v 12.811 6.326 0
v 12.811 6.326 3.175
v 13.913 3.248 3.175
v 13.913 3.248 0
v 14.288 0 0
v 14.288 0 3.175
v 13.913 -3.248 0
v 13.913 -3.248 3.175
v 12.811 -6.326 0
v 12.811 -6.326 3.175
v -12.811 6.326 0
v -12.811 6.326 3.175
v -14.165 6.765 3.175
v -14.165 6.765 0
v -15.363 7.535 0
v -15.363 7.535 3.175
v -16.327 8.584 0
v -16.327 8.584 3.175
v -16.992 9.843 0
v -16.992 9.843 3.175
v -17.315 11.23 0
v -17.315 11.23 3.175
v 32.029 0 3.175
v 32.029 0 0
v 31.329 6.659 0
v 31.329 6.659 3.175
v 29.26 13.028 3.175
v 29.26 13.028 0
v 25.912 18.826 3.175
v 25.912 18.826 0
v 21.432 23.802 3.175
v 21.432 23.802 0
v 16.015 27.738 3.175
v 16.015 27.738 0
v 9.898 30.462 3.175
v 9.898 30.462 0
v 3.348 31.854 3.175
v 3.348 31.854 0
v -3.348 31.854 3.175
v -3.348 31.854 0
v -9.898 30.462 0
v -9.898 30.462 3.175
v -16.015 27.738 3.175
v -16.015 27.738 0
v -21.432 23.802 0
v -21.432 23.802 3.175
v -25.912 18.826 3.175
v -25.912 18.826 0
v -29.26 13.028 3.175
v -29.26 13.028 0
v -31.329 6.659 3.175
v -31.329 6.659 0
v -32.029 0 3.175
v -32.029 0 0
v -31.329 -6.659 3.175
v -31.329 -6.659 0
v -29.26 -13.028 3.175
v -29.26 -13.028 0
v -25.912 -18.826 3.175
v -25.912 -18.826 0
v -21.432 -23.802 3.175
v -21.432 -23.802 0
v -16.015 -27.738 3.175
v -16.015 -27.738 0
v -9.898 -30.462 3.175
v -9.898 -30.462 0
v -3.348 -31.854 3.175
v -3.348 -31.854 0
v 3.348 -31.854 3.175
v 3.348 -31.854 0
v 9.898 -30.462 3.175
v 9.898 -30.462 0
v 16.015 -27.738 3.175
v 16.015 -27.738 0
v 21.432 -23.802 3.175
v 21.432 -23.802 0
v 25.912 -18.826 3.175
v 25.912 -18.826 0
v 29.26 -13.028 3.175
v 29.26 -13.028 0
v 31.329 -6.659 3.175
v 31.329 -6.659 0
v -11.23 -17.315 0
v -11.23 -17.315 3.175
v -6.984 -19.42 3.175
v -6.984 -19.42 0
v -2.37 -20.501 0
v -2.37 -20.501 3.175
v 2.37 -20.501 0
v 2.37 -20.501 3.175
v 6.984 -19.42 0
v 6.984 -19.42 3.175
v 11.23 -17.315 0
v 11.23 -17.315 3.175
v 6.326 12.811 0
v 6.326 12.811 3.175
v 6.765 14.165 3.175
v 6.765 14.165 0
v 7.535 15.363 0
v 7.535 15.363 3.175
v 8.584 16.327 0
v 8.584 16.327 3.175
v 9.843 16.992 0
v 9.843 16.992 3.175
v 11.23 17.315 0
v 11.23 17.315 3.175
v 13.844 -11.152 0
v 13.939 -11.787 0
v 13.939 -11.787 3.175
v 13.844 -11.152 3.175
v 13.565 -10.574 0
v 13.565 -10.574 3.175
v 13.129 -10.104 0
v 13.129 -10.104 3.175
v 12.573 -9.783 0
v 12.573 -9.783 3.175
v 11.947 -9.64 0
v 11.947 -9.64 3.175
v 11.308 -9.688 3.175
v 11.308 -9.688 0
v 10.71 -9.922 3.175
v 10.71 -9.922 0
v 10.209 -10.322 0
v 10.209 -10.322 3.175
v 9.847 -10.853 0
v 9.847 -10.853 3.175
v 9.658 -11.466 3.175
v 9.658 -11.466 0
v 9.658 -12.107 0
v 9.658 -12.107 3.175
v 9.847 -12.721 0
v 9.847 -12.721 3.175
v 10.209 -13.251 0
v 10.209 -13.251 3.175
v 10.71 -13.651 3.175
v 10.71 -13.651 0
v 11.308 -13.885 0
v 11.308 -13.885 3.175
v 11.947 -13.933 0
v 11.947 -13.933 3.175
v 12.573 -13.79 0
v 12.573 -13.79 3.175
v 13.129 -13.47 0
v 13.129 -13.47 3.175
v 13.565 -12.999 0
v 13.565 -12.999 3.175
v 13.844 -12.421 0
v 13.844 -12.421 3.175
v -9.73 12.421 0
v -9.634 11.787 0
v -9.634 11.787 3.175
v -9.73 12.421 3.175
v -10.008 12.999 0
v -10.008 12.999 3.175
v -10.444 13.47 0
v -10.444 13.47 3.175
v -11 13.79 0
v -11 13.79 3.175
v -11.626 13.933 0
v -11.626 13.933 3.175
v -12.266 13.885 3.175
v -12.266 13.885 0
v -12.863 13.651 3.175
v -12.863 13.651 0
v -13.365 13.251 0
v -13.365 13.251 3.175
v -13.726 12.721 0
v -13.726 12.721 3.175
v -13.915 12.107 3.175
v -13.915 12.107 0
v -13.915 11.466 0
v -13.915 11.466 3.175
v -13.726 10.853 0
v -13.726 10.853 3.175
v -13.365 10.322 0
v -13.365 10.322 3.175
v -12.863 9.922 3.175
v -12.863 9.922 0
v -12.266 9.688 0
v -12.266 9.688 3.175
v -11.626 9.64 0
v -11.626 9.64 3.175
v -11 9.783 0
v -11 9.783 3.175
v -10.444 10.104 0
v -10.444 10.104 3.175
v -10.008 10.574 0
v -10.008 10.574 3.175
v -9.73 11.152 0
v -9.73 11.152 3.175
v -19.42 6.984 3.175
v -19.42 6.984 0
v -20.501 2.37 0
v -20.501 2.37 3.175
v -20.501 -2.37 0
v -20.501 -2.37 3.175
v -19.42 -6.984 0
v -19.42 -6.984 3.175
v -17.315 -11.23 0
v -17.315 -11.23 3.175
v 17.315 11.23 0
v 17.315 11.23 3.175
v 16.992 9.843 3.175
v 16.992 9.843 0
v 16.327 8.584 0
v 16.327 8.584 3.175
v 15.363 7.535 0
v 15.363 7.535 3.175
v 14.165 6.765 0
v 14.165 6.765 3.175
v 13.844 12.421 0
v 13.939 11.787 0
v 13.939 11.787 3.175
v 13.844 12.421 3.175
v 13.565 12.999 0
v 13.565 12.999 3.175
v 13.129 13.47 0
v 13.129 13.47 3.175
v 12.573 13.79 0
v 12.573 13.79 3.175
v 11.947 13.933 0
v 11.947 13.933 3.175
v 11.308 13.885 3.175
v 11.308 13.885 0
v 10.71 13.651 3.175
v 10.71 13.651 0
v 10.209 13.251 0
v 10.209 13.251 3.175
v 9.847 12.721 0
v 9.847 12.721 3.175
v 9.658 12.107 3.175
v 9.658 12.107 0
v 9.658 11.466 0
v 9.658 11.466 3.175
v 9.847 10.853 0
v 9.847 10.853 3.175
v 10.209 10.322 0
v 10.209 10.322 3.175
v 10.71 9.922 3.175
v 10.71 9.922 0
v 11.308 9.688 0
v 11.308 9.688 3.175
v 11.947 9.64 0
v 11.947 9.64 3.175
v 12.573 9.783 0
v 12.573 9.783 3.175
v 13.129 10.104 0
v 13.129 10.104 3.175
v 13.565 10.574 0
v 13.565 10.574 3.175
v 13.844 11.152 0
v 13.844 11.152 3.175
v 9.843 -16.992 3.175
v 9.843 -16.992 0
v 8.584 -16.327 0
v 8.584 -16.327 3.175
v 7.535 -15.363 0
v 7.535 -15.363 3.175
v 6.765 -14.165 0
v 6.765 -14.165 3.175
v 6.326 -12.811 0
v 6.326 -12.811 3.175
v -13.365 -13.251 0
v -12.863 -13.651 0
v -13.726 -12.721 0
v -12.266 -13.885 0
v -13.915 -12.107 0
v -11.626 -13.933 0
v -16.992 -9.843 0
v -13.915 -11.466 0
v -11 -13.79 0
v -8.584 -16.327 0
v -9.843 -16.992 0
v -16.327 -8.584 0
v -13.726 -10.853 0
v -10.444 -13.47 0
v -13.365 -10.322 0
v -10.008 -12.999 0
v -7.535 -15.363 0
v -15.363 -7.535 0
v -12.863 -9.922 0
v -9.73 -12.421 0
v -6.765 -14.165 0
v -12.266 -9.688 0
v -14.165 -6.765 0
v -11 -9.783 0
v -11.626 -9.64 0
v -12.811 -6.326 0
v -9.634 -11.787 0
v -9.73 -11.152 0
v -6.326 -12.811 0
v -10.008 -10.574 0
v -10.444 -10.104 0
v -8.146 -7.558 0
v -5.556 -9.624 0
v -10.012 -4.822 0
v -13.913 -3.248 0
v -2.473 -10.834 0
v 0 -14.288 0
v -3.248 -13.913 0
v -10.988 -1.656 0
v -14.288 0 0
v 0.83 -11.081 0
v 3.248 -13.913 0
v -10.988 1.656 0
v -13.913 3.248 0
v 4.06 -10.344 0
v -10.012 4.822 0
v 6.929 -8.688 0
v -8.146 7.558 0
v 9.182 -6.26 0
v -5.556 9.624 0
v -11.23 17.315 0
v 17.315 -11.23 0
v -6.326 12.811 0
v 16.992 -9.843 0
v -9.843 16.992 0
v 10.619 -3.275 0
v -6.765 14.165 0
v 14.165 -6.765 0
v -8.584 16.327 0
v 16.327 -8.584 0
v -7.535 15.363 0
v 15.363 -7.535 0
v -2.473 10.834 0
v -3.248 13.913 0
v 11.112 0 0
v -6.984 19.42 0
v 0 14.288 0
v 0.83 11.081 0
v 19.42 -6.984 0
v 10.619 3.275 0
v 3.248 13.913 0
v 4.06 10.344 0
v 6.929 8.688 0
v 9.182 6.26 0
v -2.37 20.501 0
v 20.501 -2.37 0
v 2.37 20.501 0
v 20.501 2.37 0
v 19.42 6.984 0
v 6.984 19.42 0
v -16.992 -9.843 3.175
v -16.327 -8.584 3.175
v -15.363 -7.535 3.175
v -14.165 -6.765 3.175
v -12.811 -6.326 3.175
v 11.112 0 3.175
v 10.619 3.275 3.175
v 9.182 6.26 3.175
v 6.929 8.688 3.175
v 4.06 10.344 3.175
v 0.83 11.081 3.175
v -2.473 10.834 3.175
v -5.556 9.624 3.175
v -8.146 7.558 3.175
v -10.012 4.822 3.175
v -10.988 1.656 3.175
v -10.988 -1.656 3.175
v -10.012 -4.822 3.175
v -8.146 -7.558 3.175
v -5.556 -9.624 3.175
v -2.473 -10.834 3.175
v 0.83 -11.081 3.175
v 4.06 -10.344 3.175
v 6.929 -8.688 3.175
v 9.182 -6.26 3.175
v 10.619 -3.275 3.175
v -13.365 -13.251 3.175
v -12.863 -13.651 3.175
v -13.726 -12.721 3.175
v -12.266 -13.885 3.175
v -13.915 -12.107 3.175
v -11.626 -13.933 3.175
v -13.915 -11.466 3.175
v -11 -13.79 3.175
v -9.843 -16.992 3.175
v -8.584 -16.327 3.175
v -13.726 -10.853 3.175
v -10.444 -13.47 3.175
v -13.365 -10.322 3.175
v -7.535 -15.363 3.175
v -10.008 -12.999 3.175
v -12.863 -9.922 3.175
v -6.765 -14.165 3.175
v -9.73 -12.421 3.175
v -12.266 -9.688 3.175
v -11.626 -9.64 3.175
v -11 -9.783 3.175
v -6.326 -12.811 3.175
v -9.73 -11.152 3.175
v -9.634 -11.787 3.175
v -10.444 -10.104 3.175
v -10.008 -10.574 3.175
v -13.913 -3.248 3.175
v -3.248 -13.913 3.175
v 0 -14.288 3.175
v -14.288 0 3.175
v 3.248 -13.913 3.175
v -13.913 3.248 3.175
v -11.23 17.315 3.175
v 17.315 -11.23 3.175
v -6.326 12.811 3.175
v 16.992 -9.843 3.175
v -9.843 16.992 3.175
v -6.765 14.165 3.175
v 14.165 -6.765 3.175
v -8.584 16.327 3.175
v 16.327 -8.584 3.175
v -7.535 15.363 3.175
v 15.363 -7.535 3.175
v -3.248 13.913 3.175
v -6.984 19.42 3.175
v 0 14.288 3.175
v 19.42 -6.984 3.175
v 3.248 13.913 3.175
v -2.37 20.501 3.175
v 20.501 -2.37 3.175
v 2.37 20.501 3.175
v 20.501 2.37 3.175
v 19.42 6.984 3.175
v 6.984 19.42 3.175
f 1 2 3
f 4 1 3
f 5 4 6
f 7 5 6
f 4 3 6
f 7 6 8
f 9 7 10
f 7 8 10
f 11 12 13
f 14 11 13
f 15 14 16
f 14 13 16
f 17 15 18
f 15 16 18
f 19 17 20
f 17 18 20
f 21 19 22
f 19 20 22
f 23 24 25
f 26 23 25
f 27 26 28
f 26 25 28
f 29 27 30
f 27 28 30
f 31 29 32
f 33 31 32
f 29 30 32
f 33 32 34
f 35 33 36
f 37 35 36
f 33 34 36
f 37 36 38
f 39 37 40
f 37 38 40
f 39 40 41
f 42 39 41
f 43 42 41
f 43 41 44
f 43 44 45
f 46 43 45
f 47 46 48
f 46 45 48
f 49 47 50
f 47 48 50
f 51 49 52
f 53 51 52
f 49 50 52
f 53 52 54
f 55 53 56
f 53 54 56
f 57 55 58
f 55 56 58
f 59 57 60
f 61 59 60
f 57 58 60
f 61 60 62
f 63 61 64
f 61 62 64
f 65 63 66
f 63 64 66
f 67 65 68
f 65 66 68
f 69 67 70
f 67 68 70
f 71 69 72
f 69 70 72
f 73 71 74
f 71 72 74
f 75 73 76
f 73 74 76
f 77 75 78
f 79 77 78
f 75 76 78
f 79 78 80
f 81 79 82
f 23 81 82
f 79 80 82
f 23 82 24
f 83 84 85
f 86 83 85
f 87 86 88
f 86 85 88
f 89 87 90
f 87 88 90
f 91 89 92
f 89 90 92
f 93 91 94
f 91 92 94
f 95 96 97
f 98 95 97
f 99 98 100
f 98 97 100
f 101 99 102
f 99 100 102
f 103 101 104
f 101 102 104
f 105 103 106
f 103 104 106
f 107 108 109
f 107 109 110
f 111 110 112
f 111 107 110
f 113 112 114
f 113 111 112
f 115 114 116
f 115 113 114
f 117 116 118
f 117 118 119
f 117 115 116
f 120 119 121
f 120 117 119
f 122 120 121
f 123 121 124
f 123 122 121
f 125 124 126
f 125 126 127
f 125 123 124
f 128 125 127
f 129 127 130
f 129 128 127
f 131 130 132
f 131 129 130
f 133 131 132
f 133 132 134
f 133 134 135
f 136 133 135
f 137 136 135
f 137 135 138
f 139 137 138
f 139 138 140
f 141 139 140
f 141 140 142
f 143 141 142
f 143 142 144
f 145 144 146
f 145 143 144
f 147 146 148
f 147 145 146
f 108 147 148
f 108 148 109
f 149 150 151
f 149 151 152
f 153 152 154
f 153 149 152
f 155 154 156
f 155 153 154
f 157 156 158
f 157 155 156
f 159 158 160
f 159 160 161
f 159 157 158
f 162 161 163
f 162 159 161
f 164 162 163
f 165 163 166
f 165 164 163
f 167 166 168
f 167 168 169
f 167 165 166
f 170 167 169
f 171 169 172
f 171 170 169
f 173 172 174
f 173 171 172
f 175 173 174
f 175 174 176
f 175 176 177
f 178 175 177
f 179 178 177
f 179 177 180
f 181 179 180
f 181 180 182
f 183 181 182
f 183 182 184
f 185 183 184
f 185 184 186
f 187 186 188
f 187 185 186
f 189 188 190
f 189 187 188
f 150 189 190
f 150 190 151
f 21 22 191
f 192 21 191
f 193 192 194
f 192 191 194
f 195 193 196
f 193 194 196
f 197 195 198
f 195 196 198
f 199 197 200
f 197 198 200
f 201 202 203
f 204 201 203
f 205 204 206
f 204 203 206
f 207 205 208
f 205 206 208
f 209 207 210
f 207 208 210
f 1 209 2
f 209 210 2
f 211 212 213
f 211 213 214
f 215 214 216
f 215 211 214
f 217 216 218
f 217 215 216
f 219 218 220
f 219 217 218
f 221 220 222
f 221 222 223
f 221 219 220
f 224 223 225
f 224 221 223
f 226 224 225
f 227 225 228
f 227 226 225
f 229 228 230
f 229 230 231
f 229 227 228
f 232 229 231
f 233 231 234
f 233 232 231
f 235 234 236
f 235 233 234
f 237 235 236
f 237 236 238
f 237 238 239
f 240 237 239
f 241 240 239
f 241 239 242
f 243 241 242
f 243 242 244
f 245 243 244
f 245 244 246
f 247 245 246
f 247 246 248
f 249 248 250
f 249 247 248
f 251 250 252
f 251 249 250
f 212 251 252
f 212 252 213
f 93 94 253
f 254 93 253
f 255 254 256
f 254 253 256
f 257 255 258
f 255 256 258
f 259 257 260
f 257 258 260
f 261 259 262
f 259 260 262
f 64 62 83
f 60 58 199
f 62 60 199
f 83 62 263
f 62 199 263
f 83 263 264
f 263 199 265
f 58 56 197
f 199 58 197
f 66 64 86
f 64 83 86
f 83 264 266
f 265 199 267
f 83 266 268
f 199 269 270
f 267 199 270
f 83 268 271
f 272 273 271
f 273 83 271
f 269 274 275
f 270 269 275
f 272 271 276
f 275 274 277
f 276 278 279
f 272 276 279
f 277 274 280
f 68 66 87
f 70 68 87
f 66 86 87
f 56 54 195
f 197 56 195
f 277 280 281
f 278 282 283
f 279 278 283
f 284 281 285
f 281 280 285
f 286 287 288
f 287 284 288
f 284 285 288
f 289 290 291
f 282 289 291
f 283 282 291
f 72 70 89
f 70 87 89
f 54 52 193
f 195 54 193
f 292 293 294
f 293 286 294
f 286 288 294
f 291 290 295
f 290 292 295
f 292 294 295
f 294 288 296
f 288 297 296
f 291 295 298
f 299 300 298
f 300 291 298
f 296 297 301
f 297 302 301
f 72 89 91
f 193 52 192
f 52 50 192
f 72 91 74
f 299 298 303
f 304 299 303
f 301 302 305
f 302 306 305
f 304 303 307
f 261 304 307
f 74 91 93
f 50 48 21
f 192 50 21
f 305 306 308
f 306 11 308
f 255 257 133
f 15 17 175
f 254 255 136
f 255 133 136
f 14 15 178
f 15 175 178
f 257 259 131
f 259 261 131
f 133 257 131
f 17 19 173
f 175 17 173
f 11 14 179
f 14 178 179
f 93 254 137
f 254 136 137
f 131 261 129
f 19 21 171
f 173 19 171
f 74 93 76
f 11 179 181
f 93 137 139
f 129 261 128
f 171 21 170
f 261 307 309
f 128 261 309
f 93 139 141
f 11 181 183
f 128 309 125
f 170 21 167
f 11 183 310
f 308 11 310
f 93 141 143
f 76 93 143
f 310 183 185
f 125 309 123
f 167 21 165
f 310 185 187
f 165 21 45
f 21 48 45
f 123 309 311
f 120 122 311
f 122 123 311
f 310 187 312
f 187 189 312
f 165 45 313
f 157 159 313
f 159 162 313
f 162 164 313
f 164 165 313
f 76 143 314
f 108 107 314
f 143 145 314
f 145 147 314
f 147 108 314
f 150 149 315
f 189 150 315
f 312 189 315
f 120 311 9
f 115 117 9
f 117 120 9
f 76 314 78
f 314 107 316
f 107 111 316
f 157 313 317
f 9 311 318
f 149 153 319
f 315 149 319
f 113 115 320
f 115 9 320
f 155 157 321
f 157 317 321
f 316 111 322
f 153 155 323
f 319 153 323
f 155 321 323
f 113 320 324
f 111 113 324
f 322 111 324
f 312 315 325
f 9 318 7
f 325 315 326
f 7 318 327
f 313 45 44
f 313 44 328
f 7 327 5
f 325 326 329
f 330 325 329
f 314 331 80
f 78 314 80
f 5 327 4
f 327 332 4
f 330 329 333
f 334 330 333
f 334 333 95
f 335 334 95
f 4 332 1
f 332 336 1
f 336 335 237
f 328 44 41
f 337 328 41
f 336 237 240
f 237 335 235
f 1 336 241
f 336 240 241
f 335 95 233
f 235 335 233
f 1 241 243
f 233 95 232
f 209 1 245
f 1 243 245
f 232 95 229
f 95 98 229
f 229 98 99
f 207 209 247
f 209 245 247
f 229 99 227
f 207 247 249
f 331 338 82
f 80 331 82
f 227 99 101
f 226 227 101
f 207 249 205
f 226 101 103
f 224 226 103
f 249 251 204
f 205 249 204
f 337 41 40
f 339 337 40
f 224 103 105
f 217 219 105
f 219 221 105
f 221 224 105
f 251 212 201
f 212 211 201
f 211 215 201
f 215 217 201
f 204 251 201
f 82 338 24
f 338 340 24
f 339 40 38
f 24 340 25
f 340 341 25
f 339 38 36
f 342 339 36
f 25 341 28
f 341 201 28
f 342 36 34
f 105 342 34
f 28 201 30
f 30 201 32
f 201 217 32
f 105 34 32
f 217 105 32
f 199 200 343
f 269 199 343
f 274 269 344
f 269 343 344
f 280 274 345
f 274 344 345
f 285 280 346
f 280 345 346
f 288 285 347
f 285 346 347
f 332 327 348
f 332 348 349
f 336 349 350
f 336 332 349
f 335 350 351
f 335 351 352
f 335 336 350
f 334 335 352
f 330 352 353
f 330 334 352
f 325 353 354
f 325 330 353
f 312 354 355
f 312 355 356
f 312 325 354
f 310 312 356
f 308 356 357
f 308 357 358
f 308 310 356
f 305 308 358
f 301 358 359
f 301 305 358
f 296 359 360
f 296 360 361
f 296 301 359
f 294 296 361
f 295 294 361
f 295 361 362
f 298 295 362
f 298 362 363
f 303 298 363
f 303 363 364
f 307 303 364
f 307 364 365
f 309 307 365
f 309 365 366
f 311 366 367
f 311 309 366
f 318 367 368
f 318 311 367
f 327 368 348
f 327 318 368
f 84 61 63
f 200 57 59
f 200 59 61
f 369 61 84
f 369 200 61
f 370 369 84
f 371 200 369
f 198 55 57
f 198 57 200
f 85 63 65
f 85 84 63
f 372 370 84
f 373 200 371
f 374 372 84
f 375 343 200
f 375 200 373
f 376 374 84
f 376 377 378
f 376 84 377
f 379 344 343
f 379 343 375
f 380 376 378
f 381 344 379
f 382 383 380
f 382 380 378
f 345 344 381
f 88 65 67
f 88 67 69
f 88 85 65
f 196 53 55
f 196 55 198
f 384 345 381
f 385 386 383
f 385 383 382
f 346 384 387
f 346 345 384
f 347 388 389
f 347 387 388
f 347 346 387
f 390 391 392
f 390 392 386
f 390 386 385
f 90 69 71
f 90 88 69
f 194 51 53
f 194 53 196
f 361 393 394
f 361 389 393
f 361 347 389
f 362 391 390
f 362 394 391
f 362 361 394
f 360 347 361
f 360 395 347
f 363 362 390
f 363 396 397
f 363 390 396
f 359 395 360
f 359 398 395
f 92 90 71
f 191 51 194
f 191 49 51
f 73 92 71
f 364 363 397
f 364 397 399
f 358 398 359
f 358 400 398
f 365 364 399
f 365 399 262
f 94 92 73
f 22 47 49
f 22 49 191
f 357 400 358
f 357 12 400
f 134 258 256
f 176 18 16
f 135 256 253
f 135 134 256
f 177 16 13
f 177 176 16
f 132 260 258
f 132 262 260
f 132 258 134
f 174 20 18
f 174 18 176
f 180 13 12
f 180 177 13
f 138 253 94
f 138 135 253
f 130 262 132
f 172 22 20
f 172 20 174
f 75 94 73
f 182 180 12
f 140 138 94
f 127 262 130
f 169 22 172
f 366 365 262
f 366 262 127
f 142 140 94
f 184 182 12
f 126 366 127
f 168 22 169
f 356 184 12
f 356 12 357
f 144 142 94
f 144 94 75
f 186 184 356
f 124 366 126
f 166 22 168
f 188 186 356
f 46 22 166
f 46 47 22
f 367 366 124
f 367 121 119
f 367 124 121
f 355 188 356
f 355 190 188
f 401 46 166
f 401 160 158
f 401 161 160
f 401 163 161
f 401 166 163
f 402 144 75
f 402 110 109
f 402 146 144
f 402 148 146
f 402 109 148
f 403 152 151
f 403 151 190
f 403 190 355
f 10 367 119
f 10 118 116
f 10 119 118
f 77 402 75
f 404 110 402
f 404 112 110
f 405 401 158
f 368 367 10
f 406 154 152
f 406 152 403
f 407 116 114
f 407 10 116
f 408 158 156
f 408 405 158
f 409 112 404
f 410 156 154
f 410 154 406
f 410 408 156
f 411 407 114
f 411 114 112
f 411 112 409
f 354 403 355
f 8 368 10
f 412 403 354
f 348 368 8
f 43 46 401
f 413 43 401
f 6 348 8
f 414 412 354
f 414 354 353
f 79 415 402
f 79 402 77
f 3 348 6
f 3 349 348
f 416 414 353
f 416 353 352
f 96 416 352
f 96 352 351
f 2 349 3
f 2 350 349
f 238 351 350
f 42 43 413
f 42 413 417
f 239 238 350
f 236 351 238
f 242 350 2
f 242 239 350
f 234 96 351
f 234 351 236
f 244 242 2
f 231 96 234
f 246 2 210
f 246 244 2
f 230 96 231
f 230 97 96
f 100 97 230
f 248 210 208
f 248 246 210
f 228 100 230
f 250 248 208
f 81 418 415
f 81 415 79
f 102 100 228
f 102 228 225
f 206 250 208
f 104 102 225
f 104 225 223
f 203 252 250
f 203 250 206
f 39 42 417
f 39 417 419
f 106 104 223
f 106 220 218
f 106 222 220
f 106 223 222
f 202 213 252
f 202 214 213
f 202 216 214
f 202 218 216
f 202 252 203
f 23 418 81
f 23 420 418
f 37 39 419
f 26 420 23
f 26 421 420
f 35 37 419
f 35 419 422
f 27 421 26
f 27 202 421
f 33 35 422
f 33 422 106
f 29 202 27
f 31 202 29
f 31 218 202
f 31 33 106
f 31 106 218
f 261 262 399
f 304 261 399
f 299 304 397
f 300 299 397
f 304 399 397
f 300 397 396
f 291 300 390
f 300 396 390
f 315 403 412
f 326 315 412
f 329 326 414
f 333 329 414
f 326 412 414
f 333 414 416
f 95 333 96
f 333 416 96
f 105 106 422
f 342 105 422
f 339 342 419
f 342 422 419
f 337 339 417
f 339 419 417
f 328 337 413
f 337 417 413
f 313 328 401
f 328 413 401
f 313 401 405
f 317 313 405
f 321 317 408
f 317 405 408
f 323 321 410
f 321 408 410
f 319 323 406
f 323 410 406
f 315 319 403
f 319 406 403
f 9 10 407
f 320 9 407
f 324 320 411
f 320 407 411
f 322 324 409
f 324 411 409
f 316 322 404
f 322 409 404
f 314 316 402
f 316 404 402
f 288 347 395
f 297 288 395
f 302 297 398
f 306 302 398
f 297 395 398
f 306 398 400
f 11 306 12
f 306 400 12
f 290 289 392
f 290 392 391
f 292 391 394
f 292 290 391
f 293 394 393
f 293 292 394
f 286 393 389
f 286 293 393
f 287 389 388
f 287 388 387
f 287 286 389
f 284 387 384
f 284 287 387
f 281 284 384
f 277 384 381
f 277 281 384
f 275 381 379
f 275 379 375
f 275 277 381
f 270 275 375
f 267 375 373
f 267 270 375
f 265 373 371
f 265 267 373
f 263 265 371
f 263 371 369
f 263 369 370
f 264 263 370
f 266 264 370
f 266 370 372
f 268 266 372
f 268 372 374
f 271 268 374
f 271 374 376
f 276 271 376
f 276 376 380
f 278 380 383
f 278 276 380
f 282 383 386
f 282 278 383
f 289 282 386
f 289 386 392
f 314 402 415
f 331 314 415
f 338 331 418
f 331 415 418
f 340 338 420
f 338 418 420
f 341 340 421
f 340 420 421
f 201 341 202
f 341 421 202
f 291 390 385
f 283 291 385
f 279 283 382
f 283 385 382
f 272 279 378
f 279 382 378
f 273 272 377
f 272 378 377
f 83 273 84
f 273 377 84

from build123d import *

# Parameters (mm, degrees)
F0_R            = 32.0294
F0_R_2          = 2.15265
F0_R_3          = 11.1125
F1_DEPTH        = 3.175
F3_DEPTH        = 3.175
F3_COPIES_COUNT = 4


# Not quite as in the source:
# - a pattern or mirror of a feature is missing from the dataset's text; its kind, count and spacing are read off the source's solid
# - a feature names something its author has since deleted; it is built from what else it names


with BuildPart() as f1:
    # F0 (on Top) → F1 (new body)
    with BuildSketch(Plane.XY):
        Circle(F0_R)
        with Locations((-11.7865861589, -11.7865861589)):
            Circle(F0_R_2, mode=Mode.SUBTRACT)
        with Locations((11.7865861589, -11.7865861589)):
            Circle(F0_R_2, mode=Mode.SUBTRACT)
        with Locations((-11.7865861589, 11.7865861589)):
            Circle(F0_R_2, mode=Mode.SUBTRACT)
        Circle(F0_R_3, mode=Mode.SUBTRACT)
        with Locations((11.7865861589, 11.7865861589)):
            Circle(F0_R_2, mode=Mode.SUBTRACT)
    extrude(amount=F1_DEPTH)

    # F2 (on face) → F3 (cut, through all)
    with BuildSketch(Plane.XY.offset(3.175)):
        with BuildLine():
            ThreePointArc((-11.229543123, 17.3148424047), (-8.0281867, 15.8788163052), (-6.3255746232, 12.8109235396))
            ThreePointArc((-6.3255746232, 12.8109235396), (0, 14.2875), (6.3255746232, 12.8109235396))
            ThreePointArc((6.3255746232, 12.8109235396), (8.0281867, 15.8788163052), (11.229543123, 17.3148424047))
            ThreePointArc((11.229543123, 17.3148424047), (0, 20.6375), (-11.229543123, 17.3148424047))
        make_face()
    f3 = extrude(amount=-F3_DEPTH, mode=Mode.SUBTRACT)

    # F3_copies: F3 ×4 about axis
    f3_copies_axis = Axis((0, 0, 0), (0, 0, 1))
    for i in range(1, F3_COPIES_COUNT):
        add(f3.rotate(f3_copies_axis, i * 360 / F3_COPIES_COUNT), mode=Mode.SUBTRACT)


solid = f1.part
